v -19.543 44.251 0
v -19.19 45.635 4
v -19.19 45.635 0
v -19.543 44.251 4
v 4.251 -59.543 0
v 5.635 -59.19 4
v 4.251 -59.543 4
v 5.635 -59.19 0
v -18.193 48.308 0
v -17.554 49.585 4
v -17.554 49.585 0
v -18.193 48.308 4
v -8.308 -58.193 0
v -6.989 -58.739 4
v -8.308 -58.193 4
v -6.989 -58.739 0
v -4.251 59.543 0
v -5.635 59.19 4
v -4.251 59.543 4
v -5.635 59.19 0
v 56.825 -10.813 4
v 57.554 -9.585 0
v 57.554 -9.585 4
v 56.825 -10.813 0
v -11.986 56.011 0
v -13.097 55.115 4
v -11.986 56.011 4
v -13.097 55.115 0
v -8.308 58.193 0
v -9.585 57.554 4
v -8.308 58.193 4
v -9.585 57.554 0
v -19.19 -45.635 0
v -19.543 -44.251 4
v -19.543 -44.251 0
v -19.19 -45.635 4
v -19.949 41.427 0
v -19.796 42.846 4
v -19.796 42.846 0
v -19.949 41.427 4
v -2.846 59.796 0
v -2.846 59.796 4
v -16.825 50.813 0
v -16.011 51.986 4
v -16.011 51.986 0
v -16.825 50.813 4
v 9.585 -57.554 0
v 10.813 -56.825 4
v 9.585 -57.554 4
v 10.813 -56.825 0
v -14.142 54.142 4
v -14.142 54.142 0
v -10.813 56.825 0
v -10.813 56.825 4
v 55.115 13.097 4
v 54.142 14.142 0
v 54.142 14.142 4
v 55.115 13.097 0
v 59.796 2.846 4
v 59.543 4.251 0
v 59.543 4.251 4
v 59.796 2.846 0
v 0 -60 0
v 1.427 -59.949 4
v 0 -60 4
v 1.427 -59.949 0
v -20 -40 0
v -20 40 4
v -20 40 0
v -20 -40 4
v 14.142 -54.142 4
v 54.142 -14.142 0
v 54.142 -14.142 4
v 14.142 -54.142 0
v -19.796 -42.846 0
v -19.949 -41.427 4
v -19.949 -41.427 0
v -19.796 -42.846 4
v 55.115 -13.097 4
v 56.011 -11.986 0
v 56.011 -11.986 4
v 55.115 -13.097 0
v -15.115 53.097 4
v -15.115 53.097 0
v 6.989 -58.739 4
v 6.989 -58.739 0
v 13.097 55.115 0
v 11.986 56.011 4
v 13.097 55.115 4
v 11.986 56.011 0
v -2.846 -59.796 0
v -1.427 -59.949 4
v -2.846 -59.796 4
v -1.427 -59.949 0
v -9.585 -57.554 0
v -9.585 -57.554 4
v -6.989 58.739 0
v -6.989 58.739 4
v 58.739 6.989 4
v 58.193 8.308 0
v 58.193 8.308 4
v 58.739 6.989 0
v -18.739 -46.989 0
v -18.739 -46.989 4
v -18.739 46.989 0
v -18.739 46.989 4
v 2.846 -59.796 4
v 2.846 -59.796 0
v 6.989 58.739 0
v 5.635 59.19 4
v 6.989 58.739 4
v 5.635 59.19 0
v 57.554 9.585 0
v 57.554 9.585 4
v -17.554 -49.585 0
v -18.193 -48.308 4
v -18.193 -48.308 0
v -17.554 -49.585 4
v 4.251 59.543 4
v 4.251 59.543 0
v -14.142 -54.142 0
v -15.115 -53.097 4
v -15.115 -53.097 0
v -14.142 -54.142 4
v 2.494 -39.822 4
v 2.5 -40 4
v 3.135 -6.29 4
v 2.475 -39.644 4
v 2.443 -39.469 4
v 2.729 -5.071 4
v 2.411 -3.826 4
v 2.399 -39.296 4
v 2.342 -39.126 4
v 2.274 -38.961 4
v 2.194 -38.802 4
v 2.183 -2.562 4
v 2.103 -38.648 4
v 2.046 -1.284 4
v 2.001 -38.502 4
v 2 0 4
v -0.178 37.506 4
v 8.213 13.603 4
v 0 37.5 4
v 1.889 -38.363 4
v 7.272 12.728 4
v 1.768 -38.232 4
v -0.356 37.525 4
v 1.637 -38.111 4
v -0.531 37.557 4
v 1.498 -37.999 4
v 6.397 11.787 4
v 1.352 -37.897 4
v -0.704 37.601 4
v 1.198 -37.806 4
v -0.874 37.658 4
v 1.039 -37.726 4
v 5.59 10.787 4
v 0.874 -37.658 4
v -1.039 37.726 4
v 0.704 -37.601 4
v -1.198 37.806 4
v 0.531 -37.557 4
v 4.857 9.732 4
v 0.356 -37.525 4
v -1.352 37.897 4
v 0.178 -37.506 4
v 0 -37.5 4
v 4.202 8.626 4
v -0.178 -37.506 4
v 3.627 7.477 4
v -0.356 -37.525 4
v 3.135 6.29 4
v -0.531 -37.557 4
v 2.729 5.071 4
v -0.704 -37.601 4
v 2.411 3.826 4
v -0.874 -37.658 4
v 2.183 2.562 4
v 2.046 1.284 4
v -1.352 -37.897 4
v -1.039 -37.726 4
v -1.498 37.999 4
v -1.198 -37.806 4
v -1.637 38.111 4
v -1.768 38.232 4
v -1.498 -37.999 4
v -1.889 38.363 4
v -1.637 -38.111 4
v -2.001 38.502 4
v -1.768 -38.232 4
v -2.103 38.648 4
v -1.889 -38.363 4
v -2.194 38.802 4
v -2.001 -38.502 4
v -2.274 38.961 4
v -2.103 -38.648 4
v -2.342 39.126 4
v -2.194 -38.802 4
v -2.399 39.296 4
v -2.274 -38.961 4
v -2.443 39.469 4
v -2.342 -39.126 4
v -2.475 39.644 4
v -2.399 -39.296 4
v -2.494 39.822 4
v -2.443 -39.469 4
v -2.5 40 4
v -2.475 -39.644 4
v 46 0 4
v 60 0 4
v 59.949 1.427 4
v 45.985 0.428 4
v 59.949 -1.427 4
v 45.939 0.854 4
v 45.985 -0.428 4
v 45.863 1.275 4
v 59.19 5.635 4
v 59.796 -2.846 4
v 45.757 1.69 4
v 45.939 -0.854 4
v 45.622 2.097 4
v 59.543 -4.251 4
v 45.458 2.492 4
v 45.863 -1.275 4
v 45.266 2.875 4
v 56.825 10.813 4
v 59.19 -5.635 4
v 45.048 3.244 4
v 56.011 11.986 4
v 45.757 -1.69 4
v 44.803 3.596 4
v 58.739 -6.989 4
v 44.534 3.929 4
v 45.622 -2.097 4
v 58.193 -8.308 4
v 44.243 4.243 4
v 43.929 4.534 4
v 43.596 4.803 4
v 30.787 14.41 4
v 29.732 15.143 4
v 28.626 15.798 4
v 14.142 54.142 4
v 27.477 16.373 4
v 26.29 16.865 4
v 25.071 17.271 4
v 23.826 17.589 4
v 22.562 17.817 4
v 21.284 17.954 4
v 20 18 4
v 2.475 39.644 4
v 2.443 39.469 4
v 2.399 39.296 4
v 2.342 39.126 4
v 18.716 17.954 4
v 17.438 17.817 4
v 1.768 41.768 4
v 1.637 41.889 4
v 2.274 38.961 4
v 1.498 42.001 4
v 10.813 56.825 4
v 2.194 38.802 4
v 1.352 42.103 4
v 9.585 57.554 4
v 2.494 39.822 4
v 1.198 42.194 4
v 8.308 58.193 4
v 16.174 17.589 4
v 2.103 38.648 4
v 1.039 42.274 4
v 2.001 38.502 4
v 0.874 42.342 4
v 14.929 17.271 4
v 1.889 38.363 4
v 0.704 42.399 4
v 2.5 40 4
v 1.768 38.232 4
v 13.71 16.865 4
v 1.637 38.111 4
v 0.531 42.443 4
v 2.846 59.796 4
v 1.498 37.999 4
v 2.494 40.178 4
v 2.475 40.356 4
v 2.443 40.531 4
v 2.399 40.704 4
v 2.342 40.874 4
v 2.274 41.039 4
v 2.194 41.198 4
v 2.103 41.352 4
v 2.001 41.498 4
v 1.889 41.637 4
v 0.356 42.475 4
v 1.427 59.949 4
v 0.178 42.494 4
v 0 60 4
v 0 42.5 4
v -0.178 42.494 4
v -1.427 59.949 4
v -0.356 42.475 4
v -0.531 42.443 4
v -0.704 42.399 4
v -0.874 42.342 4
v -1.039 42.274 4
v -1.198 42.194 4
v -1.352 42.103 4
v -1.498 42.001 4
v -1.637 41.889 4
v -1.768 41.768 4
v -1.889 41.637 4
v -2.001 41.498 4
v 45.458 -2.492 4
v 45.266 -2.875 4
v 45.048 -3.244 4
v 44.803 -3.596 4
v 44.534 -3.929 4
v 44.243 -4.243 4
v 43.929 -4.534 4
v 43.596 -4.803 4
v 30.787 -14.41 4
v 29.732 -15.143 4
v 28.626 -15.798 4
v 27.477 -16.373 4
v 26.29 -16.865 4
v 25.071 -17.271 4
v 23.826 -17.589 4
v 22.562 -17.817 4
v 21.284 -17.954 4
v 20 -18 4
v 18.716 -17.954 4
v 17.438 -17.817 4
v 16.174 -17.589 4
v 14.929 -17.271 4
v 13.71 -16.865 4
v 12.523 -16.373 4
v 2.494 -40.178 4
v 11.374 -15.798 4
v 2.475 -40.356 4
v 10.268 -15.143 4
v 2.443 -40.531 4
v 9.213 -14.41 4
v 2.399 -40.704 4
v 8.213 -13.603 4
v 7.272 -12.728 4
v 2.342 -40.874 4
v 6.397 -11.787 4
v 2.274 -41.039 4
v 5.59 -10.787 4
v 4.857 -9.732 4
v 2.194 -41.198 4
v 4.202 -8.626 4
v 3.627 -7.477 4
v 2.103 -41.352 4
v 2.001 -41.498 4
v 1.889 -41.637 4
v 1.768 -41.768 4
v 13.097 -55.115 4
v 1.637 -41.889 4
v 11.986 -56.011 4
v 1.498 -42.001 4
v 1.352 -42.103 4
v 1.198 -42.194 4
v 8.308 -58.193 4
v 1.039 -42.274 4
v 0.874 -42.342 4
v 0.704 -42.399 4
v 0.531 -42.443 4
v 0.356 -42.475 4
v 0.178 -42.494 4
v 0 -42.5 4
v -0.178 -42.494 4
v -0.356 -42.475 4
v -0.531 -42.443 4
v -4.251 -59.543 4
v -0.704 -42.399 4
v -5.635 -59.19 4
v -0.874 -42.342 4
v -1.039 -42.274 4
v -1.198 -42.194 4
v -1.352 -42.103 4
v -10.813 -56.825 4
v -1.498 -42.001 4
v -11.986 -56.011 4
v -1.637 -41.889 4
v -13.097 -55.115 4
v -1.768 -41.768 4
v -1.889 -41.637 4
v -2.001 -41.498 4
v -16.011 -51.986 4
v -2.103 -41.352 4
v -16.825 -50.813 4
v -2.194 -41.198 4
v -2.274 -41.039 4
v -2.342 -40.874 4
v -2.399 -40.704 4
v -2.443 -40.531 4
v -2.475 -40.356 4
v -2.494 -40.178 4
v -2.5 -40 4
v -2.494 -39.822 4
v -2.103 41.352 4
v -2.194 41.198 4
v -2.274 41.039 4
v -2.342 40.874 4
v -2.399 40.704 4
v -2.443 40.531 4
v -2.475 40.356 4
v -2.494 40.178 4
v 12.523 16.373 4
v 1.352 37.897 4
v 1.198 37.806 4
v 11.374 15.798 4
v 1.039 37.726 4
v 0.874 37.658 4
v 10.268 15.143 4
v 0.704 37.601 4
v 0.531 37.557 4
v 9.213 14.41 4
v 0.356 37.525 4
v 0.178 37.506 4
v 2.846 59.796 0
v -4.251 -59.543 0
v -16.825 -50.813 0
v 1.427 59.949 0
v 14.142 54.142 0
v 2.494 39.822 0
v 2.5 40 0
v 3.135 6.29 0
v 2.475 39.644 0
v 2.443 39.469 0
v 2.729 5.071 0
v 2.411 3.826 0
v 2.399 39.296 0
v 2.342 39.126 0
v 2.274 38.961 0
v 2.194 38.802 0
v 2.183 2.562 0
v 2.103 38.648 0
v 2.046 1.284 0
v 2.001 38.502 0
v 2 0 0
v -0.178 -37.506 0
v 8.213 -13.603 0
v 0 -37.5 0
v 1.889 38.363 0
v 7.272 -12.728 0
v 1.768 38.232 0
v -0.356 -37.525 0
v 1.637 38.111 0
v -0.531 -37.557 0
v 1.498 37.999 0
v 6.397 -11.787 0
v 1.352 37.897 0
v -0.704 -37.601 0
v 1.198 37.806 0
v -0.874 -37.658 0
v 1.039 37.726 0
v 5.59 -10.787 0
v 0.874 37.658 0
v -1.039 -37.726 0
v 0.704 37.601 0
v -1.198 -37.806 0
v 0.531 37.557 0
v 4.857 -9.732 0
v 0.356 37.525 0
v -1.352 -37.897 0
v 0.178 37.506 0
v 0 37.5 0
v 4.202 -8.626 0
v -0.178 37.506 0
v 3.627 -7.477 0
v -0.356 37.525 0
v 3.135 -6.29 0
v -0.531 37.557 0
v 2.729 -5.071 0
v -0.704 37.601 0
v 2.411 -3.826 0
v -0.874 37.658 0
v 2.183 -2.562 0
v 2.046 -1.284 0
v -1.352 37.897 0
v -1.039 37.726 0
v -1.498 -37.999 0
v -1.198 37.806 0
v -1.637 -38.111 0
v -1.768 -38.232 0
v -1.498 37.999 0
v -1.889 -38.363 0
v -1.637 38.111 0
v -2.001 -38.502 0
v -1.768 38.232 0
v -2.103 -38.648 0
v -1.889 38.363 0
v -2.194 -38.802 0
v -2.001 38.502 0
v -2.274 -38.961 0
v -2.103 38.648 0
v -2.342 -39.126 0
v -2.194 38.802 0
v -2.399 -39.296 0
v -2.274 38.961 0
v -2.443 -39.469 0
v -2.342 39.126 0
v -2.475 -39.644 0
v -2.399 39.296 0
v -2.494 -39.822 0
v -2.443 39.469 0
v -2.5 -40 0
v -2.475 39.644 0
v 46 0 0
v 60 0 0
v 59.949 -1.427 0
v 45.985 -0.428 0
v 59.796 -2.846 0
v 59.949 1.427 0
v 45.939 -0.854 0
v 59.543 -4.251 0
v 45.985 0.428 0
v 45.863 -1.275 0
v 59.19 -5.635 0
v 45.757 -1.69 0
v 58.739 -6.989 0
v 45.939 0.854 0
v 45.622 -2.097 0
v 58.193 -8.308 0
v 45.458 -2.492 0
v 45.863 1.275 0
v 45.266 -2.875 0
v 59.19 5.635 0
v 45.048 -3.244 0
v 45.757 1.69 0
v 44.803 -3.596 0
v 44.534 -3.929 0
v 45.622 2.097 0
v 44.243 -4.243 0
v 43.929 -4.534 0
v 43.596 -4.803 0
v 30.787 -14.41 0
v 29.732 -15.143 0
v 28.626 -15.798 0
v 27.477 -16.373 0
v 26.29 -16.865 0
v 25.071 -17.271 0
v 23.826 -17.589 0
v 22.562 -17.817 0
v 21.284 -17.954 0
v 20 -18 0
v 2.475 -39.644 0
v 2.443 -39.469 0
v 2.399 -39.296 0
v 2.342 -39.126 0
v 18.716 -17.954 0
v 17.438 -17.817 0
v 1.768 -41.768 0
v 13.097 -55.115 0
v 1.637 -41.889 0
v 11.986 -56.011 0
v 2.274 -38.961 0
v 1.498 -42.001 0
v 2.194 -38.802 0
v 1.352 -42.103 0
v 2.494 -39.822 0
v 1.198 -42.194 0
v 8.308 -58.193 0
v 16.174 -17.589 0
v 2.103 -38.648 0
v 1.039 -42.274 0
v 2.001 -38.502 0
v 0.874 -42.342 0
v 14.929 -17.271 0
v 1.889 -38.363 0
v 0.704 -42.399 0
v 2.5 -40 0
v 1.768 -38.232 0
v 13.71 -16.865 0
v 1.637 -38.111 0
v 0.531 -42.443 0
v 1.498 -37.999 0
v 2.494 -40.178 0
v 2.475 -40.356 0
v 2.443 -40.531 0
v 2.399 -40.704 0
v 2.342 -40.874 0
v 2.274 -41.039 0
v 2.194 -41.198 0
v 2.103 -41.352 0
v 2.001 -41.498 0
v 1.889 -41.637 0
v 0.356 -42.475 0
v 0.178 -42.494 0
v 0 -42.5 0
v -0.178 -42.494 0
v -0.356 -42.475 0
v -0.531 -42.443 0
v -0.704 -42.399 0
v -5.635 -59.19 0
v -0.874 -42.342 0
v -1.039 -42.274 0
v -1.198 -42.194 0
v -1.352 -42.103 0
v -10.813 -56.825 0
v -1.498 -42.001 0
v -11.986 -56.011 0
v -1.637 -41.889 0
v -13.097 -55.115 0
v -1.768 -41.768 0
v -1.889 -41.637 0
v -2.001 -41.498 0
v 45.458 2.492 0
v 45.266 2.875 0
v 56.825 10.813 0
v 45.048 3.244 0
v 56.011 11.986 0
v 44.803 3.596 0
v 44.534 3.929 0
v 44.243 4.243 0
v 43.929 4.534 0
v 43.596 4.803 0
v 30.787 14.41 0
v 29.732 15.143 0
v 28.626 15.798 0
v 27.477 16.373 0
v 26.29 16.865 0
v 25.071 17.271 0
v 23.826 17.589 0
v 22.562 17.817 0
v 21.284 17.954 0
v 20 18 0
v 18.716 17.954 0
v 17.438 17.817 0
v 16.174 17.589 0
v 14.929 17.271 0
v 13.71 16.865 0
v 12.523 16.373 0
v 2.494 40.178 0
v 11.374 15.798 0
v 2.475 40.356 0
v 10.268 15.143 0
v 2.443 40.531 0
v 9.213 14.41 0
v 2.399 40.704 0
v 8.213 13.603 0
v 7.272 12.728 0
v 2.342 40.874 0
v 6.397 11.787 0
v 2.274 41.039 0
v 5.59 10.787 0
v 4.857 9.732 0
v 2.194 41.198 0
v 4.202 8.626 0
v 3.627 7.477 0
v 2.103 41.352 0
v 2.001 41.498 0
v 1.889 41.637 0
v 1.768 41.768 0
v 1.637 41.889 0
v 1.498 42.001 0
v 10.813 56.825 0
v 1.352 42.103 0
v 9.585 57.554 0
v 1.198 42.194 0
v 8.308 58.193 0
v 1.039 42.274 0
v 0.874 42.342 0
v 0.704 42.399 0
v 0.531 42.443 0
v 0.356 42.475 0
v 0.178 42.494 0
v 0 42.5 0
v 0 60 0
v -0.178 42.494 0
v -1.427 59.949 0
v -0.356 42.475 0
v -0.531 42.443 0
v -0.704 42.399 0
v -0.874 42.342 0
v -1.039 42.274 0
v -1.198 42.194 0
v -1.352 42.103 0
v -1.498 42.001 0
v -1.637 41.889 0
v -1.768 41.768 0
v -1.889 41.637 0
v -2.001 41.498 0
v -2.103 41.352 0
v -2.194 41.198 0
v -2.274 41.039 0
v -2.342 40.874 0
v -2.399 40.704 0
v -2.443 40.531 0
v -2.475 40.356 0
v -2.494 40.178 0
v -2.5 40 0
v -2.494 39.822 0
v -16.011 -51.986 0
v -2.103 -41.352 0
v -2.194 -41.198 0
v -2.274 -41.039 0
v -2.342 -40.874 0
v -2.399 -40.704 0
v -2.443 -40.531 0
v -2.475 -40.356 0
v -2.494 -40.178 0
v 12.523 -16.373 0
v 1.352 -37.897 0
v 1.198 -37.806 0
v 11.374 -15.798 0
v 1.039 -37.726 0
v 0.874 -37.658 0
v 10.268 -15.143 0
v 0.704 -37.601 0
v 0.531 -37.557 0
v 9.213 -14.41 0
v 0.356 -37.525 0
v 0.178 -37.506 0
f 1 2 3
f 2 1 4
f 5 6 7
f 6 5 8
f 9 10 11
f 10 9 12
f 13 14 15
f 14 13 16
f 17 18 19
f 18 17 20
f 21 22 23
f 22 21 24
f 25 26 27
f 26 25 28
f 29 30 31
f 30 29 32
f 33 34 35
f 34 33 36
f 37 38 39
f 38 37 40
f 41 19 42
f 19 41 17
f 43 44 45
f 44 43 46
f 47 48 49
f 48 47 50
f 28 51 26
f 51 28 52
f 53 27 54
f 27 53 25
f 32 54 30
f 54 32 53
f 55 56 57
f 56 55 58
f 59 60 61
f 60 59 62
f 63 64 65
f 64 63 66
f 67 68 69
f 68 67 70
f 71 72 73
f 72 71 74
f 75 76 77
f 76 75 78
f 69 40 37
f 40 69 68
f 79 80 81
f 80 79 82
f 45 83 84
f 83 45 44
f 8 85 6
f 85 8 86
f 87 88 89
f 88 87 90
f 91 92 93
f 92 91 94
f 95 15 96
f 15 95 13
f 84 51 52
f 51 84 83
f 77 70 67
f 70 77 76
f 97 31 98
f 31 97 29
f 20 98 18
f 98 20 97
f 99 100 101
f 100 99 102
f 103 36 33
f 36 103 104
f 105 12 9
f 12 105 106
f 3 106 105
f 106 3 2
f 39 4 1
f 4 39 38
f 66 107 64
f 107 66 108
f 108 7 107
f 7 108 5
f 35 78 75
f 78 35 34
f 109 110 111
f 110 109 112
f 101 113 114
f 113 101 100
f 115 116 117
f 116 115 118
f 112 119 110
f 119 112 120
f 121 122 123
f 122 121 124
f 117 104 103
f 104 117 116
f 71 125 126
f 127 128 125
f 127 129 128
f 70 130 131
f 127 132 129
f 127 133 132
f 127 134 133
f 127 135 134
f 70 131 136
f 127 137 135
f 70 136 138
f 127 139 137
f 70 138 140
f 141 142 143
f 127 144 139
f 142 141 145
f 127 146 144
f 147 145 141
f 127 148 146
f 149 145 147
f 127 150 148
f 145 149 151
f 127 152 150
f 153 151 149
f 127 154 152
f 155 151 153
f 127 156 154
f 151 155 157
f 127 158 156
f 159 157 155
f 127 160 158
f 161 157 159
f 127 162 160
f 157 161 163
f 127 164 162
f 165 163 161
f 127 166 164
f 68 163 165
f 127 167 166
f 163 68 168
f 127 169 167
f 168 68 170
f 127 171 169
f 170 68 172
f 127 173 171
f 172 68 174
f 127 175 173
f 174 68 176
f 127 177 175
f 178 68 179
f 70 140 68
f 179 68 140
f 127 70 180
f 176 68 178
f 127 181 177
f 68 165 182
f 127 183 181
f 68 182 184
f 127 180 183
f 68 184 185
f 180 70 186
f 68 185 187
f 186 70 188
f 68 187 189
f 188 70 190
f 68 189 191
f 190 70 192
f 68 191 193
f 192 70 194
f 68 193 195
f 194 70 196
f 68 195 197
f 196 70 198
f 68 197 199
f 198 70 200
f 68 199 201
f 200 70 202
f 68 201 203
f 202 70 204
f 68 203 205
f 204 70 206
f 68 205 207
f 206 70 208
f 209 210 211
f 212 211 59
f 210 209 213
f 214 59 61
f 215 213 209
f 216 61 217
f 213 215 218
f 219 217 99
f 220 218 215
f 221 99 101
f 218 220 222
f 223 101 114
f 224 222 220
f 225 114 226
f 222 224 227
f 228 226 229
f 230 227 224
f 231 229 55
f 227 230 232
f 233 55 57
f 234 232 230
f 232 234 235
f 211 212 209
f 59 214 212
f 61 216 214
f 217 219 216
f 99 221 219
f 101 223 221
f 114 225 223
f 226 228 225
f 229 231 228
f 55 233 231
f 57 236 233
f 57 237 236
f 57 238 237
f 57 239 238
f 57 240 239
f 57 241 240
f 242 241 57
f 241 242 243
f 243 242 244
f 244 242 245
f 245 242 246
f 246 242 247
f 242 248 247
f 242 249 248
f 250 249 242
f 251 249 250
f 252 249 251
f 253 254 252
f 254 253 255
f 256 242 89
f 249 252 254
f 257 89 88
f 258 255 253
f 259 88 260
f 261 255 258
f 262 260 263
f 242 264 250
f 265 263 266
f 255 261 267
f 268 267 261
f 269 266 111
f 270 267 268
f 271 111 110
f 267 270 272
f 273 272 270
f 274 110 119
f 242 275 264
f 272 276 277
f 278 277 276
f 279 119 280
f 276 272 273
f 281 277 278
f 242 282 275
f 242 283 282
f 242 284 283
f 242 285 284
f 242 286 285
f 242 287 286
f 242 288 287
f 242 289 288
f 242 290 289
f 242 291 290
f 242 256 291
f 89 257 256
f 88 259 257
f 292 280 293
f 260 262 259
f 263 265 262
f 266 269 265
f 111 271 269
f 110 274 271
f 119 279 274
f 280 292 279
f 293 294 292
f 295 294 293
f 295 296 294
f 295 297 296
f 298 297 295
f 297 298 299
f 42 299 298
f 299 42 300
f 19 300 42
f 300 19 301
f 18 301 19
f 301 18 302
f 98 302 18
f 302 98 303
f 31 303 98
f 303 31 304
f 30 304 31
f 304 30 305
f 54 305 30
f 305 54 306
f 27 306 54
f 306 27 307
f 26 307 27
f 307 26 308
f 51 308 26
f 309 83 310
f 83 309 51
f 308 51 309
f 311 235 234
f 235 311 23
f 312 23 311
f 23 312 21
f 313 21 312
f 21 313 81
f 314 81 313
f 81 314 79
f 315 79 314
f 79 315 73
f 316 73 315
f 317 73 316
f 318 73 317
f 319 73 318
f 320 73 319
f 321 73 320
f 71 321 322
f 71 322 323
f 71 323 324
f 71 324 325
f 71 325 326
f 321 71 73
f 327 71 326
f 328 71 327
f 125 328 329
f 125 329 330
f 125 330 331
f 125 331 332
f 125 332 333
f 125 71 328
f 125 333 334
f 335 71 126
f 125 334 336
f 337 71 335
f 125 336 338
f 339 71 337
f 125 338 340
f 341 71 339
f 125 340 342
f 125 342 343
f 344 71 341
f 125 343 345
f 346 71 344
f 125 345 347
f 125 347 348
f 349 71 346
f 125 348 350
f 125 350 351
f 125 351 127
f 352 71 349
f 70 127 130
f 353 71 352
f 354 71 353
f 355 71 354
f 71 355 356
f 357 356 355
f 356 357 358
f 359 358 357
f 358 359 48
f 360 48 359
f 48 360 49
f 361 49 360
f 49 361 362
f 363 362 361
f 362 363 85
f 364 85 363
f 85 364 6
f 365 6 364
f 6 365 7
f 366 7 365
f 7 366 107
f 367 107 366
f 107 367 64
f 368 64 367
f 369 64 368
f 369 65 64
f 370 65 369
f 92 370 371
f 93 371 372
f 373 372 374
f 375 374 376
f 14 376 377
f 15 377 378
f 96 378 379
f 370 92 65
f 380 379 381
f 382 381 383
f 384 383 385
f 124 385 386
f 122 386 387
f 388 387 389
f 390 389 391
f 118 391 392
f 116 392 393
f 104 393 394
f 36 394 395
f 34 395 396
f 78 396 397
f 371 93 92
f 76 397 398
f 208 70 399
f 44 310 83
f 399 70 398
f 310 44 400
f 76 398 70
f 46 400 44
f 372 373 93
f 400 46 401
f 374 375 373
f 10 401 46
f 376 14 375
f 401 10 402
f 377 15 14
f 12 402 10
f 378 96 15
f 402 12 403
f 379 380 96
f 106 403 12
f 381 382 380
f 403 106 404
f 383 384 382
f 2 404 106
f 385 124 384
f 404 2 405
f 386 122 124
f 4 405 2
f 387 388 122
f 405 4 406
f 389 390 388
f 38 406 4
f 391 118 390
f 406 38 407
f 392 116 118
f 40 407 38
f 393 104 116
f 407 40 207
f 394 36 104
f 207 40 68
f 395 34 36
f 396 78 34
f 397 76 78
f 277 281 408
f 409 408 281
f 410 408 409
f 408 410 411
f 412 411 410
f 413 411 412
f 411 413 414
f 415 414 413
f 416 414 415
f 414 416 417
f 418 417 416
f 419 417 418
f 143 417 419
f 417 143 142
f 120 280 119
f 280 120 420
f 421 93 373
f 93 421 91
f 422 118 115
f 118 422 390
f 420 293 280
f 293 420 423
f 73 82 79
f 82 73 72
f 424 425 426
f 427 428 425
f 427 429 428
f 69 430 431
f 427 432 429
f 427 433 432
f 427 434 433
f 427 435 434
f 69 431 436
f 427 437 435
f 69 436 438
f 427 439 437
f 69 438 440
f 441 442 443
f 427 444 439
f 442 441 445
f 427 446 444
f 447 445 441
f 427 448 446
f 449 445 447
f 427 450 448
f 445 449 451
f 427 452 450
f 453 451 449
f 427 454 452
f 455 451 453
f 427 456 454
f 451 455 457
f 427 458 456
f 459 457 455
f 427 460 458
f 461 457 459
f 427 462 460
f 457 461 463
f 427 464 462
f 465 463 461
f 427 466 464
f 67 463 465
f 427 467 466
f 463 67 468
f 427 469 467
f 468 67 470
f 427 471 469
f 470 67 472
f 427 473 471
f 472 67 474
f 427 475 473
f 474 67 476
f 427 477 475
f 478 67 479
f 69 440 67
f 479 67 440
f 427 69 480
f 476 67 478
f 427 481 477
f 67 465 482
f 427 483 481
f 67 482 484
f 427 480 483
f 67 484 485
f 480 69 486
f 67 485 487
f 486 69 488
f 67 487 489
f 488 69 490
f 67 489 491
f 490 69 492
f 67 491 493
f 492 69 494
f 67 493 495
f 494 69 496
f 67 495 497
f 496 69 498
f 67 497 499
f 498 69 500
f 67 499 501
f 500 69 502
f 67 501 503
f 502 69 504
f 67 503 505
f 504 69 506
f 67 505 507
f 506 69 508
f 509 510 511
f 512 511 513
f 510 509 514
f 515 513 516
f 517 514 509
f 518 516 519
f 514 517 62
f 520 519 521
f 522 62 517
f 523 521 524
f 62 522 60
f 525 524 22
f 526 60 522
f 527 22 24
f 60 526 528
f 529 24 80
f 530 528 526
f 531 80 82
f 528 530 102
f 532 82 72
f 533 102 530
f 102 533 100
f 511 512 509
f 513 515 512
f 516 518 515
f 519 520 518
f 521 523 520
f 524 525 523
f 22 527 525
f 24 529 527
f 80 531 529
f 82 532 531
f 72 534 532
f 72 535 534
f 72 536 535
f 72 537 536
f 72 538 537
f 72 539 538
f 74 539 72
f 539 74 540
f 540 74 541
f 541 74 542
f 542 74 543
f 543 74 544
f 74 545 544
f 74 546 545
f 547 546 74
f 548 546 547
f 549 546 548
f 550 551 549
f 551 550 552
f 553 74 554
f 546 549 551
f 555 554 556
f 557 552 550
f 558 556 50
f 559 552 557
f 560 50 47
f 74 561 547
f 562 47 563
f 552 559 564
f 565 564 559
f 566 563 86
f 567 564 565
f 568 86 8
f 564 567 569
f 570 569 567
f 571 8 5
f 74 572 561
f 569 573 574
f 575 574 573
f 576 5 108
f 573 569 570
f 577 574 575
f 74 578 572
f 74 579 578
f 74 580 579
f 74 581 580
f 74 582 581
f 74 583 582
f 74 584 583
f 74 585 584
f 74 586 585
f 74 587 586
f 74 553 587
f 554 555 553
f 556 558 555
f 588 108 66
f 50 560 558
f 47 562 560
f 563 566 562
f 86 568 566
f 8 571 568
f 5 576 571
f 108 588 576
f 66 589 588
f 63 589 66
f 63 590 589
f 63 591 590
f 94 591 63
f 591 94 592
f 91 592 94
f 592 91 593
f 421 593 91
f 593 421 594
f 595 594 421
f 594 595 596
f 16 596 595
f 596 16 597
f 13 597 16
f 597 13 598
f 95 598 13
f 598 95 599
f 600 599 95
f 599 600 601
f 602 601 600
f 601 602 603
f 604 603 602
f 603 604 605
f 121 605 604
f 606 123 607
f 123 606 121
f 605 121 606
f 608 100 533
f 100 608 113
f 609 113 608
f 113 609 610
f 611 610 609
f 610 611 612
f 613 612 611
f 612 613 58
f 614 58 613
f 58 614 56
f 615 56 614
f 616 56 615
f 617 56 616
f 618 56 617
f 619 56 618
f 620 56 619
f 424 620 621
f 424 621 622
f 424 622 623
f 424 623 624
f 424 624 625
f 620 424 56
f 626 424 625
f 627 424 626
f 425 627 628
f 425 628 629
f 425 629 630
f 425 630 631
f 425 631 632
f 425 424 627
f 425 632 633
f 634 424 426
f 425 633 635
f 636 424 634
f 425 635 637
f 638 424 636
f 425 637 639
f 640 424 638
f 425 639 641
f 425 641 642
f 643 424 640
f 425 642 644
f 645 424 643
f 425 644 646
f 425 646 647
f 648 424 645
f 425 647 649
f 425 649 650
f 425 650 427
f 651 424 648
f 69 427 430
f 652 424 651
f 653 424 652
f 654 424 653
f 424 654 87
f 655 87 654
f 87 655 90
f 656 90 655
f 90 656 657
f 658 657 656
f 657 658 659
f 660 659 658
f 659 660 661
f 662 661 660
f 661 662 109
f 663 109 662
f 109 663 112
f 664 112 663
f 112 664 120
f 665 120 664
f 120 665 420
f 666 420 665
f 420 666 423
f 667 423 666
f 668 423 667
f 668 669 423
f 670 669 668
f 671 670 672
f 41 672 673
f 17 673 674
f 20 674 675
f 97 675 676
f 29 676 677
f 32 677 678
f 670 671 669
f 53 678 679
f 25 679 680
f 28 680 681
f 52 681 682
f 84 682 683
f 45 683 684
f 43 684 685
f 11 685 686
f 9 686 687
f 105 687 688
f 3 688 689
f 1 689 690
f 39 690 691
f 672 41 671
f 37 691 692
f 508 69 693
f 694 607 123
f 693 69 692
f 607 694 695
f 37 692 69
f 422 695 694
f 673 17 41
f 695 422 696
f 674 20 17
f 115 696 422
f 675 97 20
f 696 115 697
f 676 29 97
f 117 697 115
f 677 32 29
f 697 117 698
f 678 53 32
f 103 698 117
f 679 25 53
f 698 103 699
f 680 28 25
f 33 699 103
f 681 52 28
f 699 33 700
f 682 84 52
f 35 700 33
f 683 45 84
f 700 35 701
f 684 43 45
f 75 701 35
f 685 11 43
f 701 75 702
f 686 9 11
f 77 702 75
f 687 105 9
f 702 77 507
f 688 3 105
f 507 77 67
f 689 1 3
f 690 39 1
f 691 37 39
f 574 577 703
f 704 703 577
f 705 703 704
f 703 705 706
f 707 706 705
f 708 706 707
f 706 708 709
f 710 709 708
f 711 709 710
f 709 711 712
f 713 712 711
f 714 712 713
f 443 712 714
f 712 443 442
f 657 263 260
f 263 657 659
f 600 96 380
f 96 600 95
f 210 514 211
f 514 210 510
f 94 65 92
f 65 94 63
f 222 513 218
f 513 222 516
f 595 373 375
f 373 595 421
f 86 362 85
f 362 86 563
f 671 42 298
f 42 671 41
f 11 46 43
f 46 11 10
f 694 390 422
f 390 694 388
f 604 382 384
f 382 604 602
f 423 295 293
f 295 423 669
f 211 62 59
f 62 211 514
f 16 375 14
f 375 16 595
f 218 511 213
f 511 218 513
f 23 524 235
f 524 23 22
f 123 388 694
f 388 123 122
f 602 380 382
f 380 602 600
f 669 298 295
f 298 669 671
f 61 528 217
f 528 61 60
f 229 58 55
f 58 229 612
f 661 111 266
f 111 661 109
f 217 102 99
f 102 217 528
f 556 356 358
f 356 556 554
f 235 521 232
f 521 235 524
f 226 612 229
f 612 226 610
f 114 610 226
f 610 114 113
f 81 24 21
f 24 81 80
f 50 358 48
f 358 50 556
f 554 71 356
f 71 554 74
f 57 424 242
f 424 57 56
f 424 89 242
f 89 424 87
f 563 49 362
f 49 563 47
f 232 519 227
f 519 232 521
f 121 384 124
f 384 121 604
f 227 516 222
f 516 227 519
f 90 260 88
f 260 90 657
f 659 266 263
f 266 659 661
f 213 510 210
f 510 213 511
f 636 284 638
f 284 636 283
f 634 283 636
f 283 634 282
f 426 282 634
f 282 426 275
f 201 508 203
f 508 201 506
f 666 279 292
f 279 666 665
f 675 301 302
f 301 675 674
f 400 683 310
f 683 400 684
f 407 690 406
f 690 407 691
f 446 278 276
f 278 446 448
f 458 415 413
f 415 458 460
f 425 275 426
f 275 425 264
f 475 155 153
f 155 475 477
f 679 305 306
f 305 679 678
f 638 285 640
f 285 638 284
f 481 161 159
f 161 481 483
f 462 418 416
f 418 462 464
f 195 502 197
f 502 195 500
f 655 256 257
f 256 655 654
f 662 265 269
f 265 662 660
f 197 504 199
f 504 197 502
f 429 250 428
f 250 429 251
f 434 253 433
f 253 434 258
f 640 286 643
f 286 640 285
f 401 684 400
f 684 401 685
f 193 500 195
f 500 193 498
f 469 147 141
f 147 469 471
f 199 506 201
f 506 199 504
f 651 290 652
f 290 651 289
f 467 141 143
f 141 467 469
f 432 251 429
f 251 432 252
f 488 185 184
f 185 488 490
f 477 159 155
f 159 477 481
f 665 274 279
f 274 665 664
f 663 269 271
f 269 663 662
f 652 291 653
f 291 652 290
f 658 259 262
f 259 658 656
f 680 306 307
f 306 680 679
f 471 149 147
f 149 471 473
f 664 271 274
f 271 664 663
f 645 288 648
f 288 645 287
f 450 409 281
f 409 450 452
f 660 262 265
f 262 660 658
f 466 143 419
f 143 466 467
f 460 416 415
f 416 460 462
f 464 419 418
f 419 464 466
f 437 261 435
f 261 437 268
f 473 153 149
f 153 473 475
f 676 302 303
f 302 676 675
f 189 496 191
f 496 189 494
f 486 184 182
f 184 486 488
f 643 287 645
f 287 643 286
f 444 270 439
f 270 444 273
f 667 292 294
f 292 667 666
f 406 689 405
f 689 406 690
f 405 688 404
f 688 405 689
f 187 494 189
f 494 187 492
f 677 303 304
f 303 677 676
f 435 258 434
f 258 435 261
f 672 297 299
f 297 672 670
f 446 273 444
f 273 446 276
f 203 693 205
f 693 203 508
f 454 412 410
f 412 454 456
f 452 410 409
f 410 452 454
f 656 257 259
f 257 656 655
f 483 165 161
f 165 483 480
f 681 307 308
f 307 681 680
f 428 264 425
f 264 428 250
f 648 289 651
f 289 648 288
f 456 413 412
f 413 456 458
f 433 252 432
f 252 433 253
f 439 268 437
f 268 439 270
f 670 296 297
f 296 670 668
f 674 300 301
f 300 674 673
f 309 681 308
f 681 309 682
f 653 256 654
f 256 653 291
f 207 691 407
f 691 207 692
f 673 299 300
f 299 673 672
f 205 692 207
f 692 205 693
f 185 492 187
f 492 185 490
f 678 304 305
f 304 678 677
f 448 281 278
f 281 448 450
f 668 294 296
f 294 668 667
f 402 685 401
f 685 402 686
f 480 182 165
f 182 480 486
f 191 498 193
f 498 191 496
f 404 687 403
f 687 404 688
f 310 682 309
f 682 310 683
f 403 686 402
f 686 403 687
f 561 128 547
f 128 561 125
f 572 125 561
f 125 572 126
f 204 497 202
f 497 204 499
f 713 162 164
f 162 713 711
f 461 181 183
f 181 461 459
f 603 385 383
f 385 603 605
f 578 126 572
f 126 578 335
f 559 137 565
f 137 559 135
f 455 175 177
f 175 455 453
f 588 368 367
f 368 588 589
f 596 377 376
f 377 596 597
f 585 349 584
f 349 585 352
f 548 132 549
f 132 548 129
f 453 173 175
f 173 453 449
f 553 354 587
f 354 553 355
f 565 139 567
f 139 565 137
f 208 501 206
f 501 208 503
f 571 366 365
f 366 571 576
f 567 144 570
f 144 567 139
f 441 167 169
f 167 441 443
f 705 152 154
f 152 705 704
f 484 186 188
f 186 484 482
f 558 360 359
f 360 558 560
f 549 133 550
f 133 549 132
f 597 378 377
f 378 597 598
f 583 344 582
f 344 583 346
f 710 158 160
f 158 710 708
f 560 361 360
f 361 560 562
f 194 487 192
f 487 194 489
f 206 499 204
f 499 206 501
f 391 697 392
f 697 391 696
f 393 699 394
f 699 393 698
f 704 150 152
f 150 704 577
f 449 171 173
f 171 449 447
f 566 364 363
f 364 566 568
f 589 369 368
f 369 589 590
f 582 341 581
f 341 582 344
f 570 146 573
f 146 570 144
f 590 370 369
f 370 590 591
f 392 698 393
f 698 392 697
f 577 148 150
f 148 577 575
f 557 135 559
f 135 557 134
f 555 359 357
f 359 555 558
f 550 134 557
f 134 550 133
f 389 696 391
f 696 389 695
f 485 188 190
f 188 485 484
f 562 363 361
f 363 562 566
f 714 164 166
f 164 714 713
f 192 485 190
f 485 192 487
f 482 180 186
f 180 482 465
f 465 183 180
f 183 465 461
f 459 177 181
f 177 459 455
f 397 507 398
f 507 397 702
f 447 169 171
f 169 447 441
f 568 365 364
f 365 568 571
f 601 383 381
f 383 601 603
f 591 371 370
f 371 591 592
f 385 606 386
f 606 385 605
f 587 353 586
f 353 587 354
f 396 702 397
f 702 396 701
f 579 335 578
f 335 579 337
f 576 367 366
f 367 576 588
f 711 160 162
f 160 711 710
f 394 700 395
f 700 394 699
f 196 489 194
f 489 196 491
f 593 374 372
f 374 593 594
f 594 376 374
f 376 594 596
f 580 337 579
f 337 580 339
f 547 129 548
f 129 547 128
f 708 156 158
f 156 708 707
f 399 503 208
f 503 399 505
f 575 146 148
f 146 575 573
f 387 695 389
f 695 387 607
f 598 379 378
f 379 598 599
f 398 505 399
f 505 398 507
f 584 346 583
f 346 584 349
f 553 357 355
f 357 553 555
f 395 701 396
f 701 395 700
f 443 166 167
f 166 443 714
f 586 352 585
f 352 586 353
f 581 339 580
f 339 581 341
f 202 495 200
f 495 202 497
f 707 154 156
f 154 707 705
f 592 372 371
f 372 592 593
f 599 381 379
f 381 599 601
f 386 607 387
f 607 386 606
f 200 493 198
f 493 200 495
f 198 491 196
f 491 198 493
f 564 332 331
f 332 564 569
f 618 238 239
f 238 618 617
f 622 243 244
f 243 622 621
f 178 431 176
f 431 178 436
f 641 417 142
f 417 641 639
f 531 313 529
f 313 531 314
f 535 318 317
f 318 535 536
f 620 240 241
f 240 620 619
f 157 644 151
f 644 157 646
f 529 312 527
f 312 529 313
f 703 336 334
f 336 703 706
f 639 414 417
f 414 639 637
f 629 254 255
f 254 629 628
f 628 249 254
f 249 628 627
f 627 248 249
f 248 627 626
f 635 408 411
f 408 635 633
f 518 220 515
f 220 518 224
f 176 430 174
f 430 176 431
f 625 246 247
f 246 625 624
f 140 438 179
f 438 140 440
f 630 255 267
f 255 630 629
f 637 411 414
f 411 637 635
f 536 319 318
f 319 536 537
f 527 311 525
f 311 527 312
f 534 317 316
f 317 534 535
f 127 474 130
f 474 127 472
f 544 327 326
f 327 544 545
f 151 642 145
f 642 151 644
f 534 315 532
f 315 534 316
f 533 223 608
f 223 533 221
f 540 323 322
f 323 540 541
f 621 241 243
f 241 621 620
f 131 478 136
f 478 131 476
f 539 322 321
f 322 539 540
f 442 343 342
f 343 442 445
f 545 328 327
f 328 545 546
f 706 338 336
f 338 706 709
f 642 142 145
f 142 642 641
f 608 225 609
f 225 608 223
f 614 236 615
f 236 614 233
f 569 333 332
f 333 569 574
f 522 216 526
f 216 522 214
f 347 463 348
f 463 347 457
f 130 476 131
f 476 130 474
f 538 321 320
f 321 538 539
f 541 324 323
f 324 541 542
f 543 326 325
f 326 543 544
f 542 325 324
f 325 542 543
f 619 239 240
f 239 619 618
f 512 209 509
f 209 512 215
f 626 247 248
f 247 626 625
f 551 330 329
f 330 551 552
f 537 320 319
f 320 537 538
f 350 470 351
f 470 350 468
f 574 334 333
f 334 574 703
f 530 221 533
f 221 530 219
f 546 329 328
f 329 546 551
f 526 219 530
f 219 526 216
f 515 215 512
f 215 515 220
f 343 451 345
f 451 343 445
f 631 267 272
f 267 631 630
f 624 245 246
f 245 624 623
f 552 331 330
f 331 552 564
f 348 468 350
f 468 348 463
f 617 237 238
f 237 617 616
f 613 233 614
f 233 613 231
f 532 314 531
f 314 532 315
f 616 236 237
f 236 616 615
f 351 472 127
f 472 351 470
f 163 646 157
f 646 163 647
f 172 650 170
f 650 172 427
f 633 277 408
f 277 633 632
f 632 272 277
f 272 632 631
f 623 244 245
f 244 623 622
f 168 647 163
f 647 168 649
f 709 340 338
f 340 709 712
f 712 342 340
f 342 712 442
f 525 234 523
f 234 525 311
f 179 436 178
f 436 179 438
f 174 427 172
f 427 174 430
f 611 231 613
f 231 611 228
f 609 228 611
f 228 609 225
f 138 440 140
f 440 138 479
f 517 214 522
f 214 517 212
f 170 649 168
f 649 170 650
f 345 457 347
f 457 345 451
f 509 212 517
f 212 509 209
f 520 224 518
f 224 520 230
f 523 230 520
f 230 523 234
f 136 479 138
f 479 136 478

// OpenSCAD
// bikespeaker1.scad
//

//---------------------------
module crossbar(tol=0){

thick=4;
wide=40;

  //
  difference(){
    hull(){
      translate([0,wide,0])
      cylinder(r=20,h=thick,$fn=88);
      translate([0,-wide,0])
      cylinder(r=20,h=thick,$fn=88);
      // third point
      translate([wide,0,0])
      cylinder(r=20,h=thick,$fn=88);      
    }  
    translate([0,wide,-1])
    cylinder(r=2.5,h=thick+2,$fn=88);
    translate([0,-wide,-1])
    cylinder(r=2.5,h=thick+2,$fn=88);
    hull(){
      translate([wide,0,-1])
      cylinder(r=6,h=thick+2,$fn=88);
      translate([wide/2,0,-1])
      cylinder(r=18,h=thick+2,$fn=88);
    }
  }
}

//=========================================

crossbar();

//=======================================
